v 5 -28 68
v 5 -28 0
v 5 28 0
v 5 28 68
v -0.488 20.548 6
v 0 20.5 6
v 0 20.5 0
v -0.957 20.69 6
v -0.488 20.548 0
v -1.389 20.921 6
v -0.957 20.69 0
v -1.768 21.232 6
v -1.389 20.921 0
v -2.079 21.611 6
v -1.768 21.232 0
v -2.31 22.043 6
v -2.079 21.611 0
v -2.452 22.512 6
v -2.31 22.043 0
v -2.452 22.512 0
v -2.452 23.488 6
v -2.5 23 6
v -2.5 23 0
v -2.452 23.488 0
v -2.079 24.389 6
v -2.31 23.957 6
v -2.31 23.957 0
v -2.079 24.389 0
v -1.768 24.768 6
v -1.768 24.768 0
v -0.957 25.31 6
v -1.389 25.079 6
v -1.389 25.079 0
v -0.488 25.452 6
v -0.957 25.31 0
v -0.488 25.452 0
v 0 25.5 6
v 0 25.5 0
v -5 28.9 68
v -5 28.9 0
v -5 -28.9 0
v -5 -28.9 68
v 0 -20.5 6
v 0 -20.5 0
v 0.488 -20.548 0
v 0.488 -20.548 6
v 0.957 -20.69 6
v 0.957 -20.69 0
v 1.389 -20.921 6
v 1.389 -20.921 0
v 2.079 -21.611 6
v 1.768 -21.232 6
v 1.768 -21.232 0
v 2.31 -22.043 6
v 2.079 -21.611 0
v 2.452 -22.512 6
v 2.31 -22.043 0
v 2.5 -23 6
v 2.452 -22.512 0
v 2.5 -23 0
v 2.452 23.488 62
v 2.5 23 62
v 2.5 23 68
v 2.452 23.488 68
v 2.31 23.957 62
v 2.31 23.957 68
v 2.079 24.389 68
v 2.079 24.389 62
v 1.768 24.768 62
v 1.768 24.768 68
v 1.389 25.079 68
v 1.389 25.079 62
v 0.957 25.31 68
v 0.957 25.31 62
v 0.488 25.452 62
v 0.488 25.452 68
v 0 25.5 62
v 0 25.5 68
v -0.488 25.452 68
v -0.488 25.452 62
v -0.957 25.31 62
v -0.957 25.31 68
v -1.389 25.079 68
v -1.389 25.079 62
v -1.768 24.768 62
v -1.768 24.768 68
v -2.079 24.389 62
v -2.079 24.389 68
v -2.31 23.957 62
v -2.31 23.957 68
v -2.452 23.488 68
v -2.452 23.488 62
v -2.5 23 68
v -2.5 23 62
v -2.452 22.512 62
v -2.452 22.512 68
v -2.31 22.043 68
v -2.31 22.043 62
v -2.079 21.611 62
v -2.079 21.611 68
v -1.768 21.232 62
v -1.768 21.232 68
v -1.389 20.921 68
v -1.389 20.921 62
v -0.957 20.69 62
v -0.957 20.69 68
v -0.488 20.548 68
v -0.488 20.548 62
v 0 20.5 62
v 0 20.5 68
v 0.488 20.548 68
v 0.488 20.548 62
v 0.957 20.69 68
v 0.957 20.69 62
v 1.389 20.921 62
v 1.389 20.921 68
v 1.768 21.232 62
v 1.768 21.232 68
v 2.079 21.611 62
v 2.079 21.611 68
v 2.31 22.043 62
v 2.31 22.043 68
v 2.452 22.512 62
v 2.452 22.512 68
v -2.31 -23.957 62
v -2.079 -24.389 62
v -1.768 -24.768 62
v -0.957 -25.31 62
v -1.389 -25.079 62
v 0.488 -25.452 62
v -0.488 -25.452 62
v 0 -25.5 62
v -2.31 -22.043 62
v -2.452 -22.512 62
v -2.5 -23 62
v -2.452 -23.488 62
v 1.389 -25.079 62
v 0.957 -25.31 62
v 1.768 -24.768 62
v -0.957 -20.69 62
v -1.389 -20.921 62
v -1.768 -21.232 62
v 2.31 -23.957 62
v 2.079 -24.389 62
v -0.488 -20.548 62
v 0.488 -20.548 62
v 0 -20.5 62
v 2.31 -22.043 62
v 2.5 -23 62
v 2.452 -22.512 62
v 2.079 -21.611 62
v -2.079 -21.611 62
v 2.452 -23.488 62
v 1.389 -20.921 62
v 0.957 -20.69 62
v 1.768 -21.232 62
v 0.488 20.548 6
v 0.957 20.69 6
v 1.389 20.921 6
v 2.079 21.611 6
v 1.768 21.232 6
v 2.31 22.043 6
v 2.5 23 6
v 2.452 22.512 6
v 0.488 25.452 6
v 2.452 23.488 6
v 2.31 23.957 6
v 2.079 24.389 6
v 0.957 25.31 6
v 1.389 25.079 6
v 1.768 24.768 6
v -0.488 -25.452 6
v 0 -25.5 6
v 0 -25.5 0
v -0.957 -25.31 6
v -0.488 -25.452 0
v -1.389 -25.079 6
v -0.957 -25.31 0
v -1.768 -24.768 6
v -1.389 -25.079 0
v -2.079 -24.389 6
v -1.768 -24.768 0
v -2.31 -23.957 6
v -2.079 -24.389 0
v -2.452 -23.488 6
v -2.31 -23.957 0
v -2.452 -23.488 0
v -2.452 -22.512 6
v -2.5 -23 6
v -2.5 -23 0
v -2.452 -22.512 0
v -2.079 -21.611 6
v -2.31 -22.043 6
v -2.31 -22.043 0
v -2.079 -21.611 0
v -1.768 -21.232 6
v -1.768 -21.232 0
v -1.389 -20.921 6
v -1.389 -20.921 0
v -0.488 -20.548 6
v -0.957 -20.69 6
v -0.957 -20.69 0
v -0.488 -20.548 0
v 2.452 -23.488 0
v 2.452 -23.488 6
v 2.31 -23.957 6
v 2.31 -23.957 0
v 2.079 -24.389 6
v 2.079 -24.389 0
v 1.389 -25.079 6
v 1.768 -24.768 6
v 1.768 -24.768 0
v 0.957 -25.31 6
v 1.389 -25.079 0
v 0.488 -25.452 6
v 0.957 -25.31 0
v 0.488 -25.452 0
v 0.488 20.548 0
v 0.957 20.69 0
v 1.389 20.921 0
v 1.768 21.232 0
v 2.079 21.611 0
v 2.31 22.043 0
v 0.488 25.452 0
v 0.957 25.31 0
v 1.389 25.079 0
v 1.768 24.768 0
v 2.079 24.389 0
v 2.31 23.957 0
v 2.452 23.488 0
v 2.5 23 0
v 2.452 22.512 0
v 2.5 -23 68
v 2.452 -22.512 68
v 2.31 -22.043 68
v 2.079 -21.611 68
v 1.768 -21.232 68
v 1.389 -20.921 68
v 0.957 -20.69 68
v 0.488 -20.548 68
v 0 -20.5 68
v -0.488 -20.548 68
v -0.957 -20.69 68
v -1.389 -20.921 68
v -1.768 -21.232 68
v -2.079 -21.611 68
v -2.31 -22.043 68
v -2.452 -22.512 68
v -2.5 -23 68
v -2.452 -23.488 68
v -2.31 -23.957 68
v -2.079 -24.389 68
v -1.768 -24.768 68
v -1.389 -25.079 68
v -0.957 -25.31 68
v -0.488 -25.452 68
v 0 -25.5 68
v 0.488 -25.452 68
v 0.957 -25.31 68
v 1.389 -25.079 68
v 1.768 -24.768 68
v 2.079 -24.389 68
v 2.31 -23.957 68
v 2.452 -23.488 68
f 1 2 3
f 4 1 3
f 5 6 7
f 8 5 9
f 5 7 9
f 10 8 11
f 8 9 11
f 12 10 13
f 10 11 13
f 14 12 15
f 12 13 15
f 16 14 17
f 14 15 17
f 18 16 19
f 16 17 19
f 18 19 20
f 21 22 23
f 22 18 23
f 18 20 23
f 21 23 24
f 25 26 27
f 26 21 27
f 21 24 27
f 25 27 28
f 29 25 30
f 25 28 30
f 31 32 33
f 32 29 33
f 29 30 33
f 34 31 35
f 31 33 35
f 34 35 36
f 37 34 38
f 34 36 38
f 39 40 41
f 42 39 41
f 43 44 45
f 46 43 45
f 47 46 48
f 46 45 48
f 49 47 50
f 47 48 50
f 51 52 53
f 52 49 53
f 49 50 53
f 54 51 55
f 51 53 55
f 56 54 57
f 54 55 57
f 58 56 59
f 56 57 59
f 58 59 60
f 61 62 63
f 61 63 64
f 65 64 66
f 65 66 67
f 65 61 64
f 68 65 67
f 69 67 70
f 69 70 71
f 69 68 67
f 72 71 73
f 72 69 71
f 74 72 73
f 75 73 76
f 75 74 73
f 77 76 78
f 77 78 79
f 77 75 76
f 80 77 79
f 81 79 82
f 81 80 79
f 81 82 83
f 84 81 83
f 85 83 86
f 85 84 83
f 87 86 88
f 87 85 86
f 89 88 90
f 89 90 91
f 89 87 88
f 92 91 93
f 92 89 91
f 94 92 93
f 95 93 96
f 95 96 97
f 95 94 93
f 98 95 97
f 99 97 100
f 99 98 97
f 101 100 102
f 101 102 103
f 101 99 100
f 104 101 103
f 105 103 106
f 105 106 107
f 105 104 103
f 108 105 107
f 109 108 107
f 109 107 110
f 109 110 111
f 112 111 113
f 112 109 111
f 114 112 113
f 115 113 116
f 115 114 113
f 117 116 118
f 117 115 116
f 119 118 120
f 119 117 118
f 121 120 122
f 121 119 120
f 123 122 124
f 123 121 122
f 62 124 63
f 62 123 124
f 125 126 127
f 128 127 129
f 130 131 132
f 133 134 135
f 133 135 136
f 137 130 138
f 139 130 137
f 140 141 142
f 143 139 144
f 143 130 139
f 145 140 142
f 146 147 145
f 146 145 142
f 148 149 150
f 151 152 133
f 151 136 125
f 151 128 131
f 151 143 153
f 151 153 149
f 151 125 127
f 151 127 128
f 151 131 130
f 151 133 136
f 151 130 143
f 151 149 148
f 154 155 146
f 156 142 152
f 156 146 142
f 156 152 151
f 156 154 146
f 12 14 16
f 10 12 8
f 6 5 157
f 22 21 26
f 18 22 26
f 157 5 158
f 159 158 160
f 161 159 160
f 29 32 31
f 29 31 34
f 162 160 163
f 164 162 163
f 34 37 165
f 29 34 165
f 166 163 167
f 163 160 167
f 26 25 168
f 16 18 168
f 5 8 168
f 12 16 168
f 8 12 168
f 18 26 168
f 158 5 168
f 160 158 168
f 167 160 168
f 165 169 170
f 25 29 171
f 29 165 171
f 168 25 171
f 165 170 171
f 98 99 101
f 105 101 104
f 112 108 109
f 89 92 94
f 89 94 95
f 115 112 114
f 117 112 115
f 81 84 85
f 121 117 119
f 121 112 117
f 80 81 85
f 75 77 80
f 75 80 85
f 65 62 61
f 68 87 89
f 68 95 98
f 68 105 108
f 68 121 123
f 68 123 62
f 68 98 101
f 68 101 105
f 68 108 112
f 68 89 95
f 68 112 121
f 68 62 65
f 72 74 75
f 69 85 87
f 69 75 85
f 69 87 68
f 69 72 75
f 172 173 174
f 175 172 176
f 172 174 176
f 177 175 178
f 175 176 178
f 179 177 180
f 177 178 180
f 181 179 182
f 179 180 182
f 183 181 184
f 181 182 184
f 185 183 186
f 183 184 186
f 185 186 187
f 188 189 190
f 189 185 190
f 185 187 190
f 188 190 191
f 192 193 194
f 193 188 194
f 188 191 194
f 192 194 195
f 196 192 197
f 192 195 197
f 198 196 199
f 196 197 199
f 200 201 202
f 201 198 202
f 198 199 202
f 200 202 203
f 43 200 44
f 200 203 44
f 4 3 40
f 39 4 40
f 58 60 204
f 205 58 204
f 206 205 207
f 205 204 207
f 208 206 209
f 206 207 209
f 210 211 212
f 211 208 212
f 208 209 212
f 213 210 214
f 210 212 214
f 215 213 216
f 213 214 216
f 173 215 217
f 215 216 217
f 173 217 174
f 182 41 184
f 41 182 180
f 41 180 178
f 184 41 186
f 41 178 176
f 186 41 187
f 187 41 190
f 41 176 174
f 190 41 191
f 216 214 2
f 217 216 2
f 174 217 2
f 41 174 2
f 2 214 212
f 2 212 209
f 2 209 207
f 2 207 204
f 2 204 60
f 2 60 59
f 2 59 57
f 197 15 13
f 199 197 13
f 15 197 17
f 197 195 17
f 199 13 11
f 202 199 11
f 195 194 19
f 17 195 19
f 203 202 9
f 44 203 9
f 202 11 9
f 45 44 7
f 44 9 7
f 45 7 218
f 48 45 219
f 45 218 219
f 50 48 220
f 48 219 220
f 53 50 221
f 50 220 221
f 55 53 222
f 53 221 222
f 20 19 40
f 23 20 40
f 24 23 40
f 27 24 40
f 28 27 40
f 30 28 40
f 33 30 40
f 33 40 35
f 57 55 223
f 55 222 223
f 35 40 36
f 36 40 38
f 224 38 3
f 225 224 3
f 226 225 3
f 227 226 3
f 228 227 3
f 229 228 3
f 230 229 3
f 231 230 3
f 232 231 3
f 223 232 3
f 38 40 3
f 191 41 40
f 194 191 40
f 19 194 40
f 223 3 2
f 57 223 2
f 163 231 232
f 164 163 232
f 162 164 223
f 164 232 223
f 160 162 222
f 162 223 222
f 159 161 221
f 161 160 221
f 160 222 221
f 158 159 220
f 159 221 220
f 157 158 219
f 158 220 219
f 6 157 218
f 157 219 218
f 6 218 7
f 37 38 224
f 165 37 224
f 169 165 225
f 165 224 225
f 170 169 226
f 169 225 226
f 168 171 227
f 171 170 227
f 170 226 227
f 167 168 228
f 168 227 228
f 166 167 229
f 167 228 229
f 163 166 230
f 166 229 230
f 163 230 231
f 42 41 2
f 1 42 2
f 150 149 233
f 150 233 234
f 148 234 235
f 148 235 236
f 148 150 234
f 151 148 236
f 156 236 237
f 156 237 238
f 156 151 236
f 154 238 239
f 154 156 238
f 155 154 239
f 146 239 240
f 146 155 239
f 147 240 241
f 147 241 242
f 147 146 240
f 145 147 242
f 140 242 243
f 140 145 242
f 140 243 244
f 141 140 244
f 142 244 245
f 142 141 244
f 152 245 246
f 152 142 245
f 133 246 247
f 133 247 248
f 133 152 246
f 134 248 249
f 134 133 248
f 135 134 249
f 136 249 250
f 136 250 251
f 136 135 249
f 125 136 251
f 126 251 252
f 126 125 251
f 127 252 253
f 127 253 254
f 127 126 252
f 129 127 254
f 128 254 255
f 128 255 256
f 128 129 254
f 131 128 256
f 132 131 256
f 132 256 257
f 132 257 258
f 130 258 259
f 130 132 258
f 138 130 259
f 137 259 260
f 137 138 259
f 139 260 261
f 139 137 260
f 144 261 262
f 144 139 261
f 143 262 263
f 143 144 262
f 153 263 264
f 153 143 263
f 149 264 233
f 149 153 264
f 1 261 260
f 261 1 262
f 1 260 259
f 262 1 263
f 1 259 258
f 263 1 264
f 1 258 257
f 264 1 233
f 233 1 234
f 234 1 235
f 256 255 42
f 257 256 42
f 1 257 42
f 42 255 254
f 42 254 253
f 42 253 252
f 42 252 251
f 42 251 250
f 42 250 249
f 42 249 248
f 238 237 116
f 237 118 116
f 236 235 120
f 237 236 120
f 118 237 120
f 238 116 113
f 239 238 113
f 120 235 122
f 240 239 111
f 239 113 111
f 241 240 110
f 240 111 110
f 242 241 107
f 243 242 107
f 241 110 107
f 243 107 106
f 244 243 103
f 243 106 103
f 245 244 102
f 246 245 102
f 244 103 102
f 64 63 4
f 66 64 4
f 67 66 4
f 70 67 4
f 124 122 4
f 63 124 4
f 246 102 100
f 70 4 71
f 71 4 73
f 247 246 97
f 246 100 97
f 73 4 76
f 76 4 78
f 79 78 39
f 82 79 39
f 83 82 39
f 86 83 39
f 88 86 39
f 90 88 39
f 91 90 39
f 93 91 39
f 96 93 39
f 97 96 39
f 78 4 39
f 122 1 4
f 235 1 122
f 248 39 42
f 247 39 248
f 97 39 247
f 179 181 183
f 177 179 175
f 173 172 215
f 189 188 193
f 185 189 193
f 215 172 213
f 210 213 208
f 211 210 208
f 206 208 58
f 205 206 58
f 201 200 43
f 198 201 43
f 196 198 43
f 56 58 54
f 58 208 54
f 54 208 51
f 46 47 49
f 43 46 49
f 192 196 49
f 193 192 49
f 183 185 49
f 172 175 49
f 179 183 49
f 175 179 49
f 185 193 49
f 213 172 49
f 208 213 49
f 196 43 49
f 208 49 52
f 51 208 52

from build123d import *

# Parameters (mm, degrees)
SKETCH1_R           = 2.5
BOSS_EXTRUDE1_DEPTH = 80
BOSS_EXTRUDE2_START = -74
SKETCH2_R           = 2.5
BOSS_EXTRUDE2_DEPTH = 74
SKETCH3_R           = 2.5
CUT_EXTRUDE1_DEPTH  = 6
SKETCH4_R           = 2.5
CUT_EXTRUDE2_DEPTH  = 6
CUT_EXTRUDE3_DEPTH  = 12
CUT_EXTRUDE4_START  = -6
SKETCH6_R           = 2.5
CUT_EXTRUDE4_DEPTH  = 6


with BuildPart() as part:
    # Sketch1 → Boss-Extrude1 (new body)
    with BuildSketch(Plane.XY):
        Polygon((5, 28), (-5, 28.9), (-5, -28.9), (5, -28), align=None)
        with Locations((0, -23)):
            Circle(SKETCH1_R, mode=Mode.SUBTRACT)
        with Locations((0, 23)):
            Circle(SKETCH1_R, mode=Mode.SUBTRACT)
    extrude(amount=BOSS_EXTRUDE1_DEPTH)

    # Sketch2 → Boss-Extrude2 (add)
    with BuildSketch(Plane.XY.offset(80).offset(BOSS_EXTRUDE2_START)):
        with Locations((0, 23)):
            Circle(SKETCH2_R)
        with Locations((0, -23)):
            Circle(SKETCH2_R)
    extrude(amount=BOSS_EXTRUDE2_DEPTH)

    # Sketch3 → Cut-Extrude1 (cut)
    with BuildSketch(Plane.XY.offset(80)):
        with Locations((0, 23.038742356)):
            Circle(SKETCH3_R)
    extrude(amount=-CUT_EXTRUDE1_DEPTH, mode=Mode.SUBTRACT)

    # Sketch4 → Cut-Extrude2 (cut)
    with BuildSketch(Plane.XY.offset(80)):
        with Locations((0, -23.038742356)):
            Circle(SKETCH4_R)
    extrude(amount=-CUT_EXTRUDE2_DEPTH, mode=Mode.SUBTRACT)

    # Sketch5 → Cut-Extrude3 (cut)
    with BuildSketch(Plane.XY.offset(80)):
        Polygon((-5, 28.9), (5, 28), (5, -28), (-5, -28.9), align=None)
    extrude(amount=-CUT_EXTRUDE3_DEPTH, mode=Mode.SUBTRACT)

    # Sketch6 → Cut-Extrude4 (cut)
    with BuildSketch(Plane.XY.offset(68).offset(CUT_EXTRUDE4_START)):
        with Locations((0, 23)):
            Circle(SKETCH6_R)
        with Locations((0, -23)):
            Circle(SKETCH6_R)
    extrude(amount=CUT_EXTRUDE4_DEPTH, mode=Mode.SUBTRACT)


solid = part.part
